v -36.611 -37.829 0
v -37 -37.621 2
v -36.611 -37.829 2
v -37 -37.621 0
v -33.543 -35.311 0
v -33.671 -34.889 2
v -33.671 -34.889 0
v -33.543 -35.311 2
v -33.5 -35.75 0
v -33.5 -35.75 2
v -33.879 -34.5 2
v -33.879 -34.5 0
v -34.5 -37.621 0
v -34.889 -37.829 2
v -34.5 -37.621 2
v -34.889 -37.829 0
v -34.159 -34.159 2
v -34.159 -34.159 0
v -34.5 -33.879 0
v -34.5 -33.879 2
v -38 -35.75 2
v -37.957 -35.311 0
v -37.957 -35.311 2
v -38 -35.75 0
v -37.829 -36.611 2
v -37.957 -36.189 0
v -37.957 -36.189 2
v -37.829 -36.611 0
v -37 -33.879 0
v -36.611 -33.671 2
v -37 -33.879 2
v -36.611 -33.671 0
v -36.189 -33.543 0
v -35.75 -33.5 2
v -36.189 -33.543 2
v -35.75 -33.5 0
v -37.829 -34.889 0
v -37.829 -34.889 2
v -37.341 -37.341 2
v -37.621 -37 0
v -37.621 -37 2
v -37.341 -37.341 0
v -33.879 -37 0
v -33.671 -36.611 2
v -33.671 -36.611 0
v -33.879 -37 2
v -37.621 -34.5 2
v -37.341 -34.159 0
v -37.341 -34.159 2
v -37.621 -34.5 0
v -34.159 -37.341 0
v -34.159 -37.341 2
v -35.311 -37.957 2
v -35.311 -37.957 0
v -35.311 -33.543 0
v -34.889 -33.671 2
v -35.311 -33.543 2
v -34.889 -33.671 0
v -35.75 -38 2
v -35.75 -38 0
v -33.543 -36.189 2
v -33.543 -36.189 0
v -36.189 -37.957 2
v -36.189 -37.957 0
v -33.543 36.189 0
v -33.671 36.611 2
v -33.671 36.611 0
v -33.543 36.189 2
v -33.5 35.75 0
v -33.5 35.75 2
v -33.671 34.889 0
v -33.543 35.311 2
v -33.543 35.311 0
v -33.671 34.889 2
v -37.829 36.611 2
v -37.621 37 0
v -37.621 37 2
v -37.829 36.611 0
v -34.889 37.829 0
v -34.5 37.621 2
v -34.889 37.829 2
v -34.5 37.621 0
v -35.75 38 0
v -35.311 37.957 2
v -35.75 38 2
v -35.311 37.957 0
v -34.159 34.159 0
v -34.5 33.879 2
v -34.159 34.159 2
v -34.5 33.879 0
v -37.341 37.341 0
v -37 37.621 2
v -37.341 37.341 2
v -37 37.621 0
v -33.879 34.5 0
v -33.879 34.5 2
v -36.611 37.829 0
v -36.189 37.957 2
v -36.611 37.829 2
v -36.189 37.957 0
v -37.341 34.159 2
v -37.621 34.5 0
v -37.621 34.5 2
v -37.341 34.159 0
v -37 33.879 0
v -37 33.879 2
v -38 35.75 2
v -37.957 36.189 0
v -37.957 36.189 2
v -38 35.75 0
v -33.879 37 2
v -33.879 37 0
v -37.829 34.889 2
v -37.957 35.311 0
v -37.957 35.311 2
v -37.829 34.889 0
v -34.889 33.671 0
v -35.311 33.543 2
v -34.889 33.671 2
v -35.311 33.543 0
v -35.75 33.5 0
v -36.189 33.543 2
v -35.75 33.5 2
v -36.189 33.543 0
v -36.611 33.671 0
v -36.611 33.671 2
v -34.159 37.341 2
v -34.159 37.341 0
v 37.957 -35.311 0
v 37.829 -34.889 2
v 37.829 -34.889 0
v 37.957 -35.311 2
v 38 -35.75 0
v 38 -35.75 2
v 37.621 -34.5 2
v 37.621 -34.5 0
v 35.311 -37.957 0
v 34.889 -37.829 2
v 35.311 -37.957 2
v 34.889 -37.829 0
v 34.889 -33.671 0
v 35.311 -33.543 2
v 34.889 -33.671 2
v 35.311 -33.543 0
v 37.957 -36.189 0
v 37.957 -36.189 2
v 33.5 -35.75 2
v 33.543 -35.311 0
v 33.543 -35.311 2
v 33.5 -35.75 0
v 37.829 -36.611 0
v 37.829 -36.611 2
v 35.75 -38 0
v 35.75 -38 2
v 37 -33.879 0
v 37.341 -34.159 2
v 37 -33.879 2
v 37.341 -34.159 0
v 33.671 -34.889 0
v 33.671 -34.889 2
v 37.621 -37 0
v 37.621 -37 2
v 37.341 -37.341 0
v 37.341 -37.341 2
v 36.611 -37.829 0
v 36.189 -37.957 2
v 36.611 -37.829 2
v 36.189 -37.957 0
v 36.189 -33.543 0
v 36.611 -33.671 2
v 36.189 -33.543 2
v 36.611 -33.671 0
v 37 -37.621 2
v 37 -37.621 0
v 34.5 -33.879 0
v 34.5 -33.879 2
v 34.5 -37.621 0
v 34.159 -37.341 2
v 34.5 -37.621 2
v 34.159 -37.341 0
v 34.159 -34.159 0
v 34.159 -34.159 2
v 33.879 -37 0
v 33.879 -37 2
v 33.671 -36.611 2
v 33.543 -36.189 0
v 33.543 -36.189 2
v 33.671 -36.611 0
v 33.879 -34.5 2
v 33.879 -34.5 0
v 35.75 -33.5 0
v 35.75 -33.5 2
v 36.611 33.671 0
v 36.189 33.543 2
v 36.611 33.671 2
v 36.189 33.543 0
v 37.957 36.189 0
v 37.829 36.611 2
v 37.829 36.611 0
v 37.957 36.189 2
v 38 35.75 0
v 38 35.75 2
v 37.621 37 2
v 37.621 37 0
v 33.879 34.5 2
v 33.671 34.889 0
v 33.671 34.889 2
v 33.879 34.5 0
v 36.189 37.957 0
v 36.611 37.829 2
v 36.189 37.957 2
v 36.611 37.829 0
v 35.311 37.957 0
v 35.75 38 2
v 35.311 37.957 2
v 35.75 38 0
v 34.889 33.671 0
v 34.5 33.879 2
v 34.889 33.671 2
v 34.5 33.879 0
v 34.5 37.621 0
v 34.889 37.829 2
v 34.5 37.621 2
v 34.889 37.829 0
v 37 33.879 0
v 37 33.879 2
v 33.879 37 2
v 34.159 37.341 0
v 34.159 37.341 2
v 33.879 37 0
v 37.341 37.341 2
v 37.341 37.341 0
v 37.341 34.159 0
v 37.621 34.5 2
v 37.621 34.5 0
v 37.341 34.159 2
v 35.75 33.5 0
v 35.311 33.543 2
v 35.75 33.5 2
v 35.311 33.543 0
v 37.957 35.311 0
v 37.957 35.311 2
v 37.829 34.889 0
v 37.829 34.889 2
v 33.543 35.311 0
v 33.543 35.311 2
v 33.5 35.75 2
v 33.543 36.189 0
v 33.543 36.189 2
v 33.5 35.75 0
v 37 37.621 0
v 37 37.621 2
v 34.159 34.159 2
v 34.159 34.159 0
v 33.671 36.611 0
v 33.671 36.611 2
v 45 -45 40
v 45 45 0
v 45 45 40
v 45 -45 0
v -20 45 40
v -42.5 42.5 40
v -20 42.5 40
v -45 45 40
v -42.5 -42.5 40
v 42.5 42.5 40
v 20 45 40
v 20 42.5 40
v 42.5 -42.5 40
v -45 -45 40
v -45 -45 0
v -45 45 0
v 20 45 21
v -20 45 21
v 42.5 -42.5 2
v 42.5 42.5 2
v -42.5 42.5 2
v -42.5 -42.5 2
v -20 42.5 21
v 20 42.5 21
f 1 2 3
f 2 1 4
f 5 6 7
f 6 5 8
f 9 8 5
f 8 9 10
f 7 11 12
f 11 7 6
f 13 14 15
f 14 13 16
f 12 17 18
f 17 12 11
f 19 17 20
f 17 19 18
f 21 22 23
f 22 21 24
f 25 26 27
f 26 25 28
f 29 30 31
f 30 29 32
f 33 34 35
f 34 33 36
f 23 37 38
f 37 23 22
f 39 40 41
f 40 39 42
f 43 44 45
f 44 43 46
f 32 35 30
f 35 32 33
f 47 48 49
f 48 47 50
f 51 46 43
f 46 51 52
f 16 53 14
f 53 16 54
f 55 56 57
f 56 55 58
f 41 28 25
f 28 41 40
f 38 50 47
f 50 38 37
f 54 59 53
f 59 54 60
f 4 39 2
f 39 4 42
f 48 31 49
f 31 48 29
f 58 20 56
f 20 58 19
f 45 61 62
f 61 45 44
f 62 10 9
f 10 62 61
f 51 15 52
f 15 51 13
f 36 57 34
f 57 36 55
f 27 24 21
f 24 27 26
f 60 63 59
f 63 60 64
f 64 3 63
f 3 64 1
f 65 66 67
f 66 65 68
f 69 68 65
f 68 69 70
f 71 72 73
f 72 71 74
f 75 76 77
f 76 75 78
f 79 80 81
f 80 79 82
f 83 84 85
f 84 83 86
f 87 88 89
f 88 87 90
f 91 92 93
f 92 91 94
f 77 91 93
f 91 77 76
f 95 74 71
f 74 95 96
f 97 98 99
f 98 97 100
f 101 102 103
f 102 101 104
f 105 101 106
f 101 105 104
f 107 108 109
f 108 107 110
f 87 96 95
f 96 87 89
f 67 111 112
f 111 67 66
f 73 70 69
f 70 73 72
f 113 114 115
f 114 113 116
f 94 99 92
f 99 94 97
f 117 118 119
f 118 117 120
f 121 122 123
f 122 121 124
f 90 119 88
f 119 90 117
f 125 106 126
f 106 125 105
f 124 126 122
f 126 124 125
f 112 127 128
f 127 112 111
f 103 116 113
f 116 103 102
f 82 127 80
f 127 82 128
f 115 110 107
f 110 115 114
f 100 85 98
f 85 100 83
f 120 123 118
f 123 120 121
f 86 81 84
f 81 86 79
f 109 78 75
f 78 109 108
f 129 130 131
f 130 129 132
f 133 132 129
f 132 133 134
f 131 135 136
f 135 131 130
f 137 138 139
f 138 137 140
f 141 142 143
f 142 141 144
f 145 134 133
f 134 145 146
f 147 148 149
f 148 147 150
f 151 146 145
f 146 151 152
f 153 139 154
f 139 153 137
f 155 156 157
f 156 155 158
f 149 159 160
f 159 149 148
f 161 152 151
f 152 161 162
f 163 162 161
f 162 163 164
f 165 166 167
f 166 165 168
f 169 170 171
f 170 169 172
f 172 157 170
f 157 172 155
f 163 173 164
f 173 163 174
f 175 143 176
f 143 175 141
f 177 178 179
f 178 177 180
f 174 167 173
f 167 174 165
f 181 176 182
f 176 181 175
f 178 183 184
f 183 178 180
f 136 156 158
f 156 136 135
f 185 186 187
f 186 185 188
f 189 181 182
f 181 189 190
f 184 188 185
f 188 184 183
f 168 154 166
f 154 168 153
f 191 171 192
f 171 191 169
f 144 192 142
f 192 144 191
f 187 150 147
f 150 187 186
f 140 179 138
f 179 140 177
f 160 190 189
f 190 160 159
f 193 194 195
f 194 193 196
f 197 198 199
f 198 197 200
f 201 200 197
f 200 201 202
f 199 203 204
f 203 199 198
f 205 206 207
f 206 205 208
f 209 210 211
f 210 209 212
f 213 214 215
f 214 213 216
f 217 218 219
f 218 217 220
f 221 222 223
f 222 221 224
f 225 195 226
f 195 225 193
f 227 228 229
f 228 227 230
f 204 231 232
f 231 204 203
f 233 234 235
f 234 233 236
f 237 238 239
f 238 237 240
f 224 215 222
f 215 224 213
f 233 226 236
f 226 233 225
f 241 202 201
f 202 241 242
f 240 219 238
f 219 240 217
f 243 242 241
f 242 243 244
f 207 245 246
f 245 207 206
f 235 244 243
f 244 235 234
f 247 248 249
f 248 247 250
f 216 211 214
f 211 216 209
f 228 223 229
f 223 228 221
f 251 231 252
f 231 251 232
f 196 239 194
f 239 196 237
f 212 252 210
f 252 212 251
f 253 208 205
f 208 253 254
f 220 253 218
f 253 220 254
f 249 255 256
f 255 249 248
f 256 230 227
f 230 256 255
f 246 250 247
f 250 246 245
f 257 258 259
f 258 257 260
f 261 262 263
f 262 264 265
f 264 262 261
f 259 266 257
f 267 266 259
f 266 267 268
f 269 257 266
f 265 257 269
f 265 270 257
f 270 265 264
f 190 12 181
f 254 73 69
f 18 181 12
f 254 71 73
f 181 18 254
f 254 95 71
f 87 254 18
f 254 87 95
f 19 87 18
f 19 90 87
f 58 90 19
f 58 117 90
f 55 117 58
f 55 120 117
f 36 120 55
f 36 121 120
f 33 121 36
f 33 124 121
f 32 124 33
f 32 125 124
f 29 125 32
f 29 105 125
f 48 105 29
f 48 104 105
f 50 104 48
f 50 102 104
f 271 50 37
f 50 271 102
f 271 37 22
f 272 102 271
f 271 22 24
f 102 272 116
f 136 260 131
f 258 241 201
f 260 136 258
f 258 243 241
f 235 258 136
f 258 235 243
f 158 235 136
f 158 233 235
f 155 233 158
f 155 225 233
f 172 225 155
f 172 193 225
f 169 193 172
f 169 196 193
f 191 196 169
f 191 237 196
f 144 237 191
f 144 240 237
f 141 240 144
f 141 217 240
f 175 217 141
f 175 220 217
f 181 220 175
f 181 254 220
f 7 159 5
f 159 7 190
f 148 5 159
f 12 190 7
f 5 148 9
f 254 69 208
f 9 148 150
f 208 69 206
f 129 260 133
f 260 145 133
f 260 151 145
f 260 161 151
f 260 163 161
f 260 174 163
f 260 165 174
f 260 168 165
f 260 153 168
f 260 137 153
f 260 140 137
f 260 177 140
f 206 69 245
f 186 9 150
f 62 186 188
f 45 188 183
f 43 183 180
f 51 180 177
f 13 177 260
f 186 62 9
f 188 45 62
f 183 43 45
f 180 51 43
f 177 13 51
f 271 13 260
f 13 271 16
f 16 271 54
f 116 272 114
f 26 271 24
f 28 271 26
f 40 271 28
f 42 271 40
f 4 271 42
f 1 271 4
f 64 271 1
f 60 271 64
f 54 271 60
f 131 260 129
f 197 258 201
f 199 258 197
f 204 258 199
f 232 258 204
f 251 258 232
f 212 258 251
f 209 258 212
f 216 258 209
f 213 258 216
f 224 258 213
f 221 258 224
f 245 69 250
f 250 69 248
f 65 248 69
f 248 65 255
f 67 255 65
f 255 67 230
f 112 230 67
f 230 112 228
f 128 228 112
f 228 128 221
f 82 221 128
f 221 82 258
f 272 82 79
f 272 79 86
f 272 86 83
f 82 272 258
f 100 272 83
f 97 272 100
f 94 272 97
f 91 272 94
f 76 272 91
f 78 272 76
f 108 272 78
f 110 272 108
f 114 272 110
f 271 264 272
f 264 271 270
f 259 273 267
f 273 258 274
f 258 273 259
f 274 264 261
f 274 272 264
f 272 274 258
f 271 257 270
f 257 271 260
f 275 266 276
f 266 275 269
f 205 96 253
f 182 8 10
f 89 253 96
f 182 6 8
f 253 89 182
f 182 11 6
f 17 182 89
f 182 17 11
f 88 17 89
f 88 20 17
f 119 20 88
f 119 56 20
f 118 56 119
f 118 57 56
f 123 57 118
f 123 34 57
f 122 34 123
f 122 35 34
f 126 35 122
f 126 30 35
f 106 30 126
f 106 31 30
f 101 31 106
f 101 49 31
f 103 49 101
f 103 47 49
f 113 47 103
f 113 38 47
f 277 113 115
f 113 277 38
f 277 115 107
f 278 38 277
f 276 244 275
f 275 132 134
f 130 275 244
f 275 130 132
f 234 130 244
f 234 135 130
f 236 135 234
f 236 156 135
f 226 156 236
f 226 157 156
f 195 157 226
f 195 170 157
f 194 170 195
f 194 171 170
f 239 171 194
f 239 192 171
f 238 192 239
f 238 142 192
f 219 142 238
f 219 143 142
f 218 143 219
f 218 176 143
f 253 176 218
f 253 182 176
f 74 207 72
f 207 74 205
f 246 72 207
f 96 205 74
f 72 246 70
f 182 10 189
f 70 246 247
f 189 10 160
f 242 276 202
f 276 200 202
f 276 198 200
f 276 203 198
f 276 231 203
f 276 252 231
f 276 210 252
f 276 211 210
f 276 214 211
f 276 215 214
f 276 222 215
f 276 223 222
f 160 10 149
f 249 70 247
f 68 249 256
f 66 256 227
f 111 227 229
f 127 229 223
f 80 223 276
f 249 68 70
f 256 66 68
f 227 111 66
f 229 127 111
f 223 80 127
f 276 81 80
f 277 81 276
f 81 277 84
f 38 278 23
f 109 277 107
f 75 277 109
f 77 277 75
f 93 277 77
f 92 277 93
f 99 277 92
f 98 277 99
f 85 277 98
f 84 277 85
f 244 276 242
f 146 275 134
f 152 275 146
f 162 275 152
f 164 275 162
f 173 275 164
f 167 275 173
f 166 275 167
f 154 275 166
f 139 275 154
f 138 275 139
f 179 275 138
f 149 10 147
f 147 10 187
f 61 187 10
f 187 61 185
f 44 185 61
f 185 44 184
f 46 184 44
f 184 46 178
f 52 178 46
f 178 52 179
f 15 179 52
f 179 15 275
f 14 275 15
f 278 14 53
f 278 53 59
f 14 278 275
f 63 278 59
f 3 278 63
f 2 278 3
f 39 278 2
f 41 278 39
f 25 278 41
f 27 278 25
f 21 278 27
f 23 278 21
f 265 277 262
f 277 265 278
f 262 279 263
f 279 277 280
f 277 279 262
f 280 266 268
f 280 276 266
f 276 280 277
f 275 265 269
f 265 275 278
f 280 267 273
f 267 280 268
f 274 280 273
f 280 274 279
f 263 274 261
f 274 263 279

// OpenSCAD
// Housing for a DIY magnetic stirrer built from an 80 mm PC fan
// Category: full hardware. Glue two magnets to the fan hub, screw the fan under the
// top plate, power it with a 12 V supply + PWM speed controller.
// Modelled in print orientation: upside down, top plate on the bed.
// Print: PETG or PLA, 0.2 mm layers, 15 % infill.
// SPDX-License-Identifier: CERN-OHL-P-2.0

/* [Housing] */
outer = [90, 90, 40];  // X, Y, height [mm]
wall = 2.5;
top_t = 2;             // stir surface; thin keeps magnets close to the stir bar
fan_hole_d = 4.5;      // M4 clearance
fan_hole_spacing = 71.5; // 80 mm fan mounting pattern
notch = [40, 19];       // cable notch width x depth, from the open edge

/* [Hidden] */
$fn = 32;
eps = 0.01;

difference() {
    translate([-outer.x / 2, -outer.y / 2, 0]) cube(outer);
    translate([-outer.x / 2 + wall, -outer.y / 2 + wall, top_t])
        cube([outer.x - 2 * wall, outer.y - 2 * wall, outer.z]);
    for (sx = [-1, 1], sy = [-1, 1])
        translate([sx * fan_hole_spacing / 2, sy * fan_hole_spacing / 2, -eps])
            cylinder(d = fan_hole_d, h = top_t + 2 * eps);
    translate([-notch.x / 2, outer.y / 2 - wall - 1, outer.z - notch.y])
        cube([notch.x, wall + 2, notch.y + eps]);
}
